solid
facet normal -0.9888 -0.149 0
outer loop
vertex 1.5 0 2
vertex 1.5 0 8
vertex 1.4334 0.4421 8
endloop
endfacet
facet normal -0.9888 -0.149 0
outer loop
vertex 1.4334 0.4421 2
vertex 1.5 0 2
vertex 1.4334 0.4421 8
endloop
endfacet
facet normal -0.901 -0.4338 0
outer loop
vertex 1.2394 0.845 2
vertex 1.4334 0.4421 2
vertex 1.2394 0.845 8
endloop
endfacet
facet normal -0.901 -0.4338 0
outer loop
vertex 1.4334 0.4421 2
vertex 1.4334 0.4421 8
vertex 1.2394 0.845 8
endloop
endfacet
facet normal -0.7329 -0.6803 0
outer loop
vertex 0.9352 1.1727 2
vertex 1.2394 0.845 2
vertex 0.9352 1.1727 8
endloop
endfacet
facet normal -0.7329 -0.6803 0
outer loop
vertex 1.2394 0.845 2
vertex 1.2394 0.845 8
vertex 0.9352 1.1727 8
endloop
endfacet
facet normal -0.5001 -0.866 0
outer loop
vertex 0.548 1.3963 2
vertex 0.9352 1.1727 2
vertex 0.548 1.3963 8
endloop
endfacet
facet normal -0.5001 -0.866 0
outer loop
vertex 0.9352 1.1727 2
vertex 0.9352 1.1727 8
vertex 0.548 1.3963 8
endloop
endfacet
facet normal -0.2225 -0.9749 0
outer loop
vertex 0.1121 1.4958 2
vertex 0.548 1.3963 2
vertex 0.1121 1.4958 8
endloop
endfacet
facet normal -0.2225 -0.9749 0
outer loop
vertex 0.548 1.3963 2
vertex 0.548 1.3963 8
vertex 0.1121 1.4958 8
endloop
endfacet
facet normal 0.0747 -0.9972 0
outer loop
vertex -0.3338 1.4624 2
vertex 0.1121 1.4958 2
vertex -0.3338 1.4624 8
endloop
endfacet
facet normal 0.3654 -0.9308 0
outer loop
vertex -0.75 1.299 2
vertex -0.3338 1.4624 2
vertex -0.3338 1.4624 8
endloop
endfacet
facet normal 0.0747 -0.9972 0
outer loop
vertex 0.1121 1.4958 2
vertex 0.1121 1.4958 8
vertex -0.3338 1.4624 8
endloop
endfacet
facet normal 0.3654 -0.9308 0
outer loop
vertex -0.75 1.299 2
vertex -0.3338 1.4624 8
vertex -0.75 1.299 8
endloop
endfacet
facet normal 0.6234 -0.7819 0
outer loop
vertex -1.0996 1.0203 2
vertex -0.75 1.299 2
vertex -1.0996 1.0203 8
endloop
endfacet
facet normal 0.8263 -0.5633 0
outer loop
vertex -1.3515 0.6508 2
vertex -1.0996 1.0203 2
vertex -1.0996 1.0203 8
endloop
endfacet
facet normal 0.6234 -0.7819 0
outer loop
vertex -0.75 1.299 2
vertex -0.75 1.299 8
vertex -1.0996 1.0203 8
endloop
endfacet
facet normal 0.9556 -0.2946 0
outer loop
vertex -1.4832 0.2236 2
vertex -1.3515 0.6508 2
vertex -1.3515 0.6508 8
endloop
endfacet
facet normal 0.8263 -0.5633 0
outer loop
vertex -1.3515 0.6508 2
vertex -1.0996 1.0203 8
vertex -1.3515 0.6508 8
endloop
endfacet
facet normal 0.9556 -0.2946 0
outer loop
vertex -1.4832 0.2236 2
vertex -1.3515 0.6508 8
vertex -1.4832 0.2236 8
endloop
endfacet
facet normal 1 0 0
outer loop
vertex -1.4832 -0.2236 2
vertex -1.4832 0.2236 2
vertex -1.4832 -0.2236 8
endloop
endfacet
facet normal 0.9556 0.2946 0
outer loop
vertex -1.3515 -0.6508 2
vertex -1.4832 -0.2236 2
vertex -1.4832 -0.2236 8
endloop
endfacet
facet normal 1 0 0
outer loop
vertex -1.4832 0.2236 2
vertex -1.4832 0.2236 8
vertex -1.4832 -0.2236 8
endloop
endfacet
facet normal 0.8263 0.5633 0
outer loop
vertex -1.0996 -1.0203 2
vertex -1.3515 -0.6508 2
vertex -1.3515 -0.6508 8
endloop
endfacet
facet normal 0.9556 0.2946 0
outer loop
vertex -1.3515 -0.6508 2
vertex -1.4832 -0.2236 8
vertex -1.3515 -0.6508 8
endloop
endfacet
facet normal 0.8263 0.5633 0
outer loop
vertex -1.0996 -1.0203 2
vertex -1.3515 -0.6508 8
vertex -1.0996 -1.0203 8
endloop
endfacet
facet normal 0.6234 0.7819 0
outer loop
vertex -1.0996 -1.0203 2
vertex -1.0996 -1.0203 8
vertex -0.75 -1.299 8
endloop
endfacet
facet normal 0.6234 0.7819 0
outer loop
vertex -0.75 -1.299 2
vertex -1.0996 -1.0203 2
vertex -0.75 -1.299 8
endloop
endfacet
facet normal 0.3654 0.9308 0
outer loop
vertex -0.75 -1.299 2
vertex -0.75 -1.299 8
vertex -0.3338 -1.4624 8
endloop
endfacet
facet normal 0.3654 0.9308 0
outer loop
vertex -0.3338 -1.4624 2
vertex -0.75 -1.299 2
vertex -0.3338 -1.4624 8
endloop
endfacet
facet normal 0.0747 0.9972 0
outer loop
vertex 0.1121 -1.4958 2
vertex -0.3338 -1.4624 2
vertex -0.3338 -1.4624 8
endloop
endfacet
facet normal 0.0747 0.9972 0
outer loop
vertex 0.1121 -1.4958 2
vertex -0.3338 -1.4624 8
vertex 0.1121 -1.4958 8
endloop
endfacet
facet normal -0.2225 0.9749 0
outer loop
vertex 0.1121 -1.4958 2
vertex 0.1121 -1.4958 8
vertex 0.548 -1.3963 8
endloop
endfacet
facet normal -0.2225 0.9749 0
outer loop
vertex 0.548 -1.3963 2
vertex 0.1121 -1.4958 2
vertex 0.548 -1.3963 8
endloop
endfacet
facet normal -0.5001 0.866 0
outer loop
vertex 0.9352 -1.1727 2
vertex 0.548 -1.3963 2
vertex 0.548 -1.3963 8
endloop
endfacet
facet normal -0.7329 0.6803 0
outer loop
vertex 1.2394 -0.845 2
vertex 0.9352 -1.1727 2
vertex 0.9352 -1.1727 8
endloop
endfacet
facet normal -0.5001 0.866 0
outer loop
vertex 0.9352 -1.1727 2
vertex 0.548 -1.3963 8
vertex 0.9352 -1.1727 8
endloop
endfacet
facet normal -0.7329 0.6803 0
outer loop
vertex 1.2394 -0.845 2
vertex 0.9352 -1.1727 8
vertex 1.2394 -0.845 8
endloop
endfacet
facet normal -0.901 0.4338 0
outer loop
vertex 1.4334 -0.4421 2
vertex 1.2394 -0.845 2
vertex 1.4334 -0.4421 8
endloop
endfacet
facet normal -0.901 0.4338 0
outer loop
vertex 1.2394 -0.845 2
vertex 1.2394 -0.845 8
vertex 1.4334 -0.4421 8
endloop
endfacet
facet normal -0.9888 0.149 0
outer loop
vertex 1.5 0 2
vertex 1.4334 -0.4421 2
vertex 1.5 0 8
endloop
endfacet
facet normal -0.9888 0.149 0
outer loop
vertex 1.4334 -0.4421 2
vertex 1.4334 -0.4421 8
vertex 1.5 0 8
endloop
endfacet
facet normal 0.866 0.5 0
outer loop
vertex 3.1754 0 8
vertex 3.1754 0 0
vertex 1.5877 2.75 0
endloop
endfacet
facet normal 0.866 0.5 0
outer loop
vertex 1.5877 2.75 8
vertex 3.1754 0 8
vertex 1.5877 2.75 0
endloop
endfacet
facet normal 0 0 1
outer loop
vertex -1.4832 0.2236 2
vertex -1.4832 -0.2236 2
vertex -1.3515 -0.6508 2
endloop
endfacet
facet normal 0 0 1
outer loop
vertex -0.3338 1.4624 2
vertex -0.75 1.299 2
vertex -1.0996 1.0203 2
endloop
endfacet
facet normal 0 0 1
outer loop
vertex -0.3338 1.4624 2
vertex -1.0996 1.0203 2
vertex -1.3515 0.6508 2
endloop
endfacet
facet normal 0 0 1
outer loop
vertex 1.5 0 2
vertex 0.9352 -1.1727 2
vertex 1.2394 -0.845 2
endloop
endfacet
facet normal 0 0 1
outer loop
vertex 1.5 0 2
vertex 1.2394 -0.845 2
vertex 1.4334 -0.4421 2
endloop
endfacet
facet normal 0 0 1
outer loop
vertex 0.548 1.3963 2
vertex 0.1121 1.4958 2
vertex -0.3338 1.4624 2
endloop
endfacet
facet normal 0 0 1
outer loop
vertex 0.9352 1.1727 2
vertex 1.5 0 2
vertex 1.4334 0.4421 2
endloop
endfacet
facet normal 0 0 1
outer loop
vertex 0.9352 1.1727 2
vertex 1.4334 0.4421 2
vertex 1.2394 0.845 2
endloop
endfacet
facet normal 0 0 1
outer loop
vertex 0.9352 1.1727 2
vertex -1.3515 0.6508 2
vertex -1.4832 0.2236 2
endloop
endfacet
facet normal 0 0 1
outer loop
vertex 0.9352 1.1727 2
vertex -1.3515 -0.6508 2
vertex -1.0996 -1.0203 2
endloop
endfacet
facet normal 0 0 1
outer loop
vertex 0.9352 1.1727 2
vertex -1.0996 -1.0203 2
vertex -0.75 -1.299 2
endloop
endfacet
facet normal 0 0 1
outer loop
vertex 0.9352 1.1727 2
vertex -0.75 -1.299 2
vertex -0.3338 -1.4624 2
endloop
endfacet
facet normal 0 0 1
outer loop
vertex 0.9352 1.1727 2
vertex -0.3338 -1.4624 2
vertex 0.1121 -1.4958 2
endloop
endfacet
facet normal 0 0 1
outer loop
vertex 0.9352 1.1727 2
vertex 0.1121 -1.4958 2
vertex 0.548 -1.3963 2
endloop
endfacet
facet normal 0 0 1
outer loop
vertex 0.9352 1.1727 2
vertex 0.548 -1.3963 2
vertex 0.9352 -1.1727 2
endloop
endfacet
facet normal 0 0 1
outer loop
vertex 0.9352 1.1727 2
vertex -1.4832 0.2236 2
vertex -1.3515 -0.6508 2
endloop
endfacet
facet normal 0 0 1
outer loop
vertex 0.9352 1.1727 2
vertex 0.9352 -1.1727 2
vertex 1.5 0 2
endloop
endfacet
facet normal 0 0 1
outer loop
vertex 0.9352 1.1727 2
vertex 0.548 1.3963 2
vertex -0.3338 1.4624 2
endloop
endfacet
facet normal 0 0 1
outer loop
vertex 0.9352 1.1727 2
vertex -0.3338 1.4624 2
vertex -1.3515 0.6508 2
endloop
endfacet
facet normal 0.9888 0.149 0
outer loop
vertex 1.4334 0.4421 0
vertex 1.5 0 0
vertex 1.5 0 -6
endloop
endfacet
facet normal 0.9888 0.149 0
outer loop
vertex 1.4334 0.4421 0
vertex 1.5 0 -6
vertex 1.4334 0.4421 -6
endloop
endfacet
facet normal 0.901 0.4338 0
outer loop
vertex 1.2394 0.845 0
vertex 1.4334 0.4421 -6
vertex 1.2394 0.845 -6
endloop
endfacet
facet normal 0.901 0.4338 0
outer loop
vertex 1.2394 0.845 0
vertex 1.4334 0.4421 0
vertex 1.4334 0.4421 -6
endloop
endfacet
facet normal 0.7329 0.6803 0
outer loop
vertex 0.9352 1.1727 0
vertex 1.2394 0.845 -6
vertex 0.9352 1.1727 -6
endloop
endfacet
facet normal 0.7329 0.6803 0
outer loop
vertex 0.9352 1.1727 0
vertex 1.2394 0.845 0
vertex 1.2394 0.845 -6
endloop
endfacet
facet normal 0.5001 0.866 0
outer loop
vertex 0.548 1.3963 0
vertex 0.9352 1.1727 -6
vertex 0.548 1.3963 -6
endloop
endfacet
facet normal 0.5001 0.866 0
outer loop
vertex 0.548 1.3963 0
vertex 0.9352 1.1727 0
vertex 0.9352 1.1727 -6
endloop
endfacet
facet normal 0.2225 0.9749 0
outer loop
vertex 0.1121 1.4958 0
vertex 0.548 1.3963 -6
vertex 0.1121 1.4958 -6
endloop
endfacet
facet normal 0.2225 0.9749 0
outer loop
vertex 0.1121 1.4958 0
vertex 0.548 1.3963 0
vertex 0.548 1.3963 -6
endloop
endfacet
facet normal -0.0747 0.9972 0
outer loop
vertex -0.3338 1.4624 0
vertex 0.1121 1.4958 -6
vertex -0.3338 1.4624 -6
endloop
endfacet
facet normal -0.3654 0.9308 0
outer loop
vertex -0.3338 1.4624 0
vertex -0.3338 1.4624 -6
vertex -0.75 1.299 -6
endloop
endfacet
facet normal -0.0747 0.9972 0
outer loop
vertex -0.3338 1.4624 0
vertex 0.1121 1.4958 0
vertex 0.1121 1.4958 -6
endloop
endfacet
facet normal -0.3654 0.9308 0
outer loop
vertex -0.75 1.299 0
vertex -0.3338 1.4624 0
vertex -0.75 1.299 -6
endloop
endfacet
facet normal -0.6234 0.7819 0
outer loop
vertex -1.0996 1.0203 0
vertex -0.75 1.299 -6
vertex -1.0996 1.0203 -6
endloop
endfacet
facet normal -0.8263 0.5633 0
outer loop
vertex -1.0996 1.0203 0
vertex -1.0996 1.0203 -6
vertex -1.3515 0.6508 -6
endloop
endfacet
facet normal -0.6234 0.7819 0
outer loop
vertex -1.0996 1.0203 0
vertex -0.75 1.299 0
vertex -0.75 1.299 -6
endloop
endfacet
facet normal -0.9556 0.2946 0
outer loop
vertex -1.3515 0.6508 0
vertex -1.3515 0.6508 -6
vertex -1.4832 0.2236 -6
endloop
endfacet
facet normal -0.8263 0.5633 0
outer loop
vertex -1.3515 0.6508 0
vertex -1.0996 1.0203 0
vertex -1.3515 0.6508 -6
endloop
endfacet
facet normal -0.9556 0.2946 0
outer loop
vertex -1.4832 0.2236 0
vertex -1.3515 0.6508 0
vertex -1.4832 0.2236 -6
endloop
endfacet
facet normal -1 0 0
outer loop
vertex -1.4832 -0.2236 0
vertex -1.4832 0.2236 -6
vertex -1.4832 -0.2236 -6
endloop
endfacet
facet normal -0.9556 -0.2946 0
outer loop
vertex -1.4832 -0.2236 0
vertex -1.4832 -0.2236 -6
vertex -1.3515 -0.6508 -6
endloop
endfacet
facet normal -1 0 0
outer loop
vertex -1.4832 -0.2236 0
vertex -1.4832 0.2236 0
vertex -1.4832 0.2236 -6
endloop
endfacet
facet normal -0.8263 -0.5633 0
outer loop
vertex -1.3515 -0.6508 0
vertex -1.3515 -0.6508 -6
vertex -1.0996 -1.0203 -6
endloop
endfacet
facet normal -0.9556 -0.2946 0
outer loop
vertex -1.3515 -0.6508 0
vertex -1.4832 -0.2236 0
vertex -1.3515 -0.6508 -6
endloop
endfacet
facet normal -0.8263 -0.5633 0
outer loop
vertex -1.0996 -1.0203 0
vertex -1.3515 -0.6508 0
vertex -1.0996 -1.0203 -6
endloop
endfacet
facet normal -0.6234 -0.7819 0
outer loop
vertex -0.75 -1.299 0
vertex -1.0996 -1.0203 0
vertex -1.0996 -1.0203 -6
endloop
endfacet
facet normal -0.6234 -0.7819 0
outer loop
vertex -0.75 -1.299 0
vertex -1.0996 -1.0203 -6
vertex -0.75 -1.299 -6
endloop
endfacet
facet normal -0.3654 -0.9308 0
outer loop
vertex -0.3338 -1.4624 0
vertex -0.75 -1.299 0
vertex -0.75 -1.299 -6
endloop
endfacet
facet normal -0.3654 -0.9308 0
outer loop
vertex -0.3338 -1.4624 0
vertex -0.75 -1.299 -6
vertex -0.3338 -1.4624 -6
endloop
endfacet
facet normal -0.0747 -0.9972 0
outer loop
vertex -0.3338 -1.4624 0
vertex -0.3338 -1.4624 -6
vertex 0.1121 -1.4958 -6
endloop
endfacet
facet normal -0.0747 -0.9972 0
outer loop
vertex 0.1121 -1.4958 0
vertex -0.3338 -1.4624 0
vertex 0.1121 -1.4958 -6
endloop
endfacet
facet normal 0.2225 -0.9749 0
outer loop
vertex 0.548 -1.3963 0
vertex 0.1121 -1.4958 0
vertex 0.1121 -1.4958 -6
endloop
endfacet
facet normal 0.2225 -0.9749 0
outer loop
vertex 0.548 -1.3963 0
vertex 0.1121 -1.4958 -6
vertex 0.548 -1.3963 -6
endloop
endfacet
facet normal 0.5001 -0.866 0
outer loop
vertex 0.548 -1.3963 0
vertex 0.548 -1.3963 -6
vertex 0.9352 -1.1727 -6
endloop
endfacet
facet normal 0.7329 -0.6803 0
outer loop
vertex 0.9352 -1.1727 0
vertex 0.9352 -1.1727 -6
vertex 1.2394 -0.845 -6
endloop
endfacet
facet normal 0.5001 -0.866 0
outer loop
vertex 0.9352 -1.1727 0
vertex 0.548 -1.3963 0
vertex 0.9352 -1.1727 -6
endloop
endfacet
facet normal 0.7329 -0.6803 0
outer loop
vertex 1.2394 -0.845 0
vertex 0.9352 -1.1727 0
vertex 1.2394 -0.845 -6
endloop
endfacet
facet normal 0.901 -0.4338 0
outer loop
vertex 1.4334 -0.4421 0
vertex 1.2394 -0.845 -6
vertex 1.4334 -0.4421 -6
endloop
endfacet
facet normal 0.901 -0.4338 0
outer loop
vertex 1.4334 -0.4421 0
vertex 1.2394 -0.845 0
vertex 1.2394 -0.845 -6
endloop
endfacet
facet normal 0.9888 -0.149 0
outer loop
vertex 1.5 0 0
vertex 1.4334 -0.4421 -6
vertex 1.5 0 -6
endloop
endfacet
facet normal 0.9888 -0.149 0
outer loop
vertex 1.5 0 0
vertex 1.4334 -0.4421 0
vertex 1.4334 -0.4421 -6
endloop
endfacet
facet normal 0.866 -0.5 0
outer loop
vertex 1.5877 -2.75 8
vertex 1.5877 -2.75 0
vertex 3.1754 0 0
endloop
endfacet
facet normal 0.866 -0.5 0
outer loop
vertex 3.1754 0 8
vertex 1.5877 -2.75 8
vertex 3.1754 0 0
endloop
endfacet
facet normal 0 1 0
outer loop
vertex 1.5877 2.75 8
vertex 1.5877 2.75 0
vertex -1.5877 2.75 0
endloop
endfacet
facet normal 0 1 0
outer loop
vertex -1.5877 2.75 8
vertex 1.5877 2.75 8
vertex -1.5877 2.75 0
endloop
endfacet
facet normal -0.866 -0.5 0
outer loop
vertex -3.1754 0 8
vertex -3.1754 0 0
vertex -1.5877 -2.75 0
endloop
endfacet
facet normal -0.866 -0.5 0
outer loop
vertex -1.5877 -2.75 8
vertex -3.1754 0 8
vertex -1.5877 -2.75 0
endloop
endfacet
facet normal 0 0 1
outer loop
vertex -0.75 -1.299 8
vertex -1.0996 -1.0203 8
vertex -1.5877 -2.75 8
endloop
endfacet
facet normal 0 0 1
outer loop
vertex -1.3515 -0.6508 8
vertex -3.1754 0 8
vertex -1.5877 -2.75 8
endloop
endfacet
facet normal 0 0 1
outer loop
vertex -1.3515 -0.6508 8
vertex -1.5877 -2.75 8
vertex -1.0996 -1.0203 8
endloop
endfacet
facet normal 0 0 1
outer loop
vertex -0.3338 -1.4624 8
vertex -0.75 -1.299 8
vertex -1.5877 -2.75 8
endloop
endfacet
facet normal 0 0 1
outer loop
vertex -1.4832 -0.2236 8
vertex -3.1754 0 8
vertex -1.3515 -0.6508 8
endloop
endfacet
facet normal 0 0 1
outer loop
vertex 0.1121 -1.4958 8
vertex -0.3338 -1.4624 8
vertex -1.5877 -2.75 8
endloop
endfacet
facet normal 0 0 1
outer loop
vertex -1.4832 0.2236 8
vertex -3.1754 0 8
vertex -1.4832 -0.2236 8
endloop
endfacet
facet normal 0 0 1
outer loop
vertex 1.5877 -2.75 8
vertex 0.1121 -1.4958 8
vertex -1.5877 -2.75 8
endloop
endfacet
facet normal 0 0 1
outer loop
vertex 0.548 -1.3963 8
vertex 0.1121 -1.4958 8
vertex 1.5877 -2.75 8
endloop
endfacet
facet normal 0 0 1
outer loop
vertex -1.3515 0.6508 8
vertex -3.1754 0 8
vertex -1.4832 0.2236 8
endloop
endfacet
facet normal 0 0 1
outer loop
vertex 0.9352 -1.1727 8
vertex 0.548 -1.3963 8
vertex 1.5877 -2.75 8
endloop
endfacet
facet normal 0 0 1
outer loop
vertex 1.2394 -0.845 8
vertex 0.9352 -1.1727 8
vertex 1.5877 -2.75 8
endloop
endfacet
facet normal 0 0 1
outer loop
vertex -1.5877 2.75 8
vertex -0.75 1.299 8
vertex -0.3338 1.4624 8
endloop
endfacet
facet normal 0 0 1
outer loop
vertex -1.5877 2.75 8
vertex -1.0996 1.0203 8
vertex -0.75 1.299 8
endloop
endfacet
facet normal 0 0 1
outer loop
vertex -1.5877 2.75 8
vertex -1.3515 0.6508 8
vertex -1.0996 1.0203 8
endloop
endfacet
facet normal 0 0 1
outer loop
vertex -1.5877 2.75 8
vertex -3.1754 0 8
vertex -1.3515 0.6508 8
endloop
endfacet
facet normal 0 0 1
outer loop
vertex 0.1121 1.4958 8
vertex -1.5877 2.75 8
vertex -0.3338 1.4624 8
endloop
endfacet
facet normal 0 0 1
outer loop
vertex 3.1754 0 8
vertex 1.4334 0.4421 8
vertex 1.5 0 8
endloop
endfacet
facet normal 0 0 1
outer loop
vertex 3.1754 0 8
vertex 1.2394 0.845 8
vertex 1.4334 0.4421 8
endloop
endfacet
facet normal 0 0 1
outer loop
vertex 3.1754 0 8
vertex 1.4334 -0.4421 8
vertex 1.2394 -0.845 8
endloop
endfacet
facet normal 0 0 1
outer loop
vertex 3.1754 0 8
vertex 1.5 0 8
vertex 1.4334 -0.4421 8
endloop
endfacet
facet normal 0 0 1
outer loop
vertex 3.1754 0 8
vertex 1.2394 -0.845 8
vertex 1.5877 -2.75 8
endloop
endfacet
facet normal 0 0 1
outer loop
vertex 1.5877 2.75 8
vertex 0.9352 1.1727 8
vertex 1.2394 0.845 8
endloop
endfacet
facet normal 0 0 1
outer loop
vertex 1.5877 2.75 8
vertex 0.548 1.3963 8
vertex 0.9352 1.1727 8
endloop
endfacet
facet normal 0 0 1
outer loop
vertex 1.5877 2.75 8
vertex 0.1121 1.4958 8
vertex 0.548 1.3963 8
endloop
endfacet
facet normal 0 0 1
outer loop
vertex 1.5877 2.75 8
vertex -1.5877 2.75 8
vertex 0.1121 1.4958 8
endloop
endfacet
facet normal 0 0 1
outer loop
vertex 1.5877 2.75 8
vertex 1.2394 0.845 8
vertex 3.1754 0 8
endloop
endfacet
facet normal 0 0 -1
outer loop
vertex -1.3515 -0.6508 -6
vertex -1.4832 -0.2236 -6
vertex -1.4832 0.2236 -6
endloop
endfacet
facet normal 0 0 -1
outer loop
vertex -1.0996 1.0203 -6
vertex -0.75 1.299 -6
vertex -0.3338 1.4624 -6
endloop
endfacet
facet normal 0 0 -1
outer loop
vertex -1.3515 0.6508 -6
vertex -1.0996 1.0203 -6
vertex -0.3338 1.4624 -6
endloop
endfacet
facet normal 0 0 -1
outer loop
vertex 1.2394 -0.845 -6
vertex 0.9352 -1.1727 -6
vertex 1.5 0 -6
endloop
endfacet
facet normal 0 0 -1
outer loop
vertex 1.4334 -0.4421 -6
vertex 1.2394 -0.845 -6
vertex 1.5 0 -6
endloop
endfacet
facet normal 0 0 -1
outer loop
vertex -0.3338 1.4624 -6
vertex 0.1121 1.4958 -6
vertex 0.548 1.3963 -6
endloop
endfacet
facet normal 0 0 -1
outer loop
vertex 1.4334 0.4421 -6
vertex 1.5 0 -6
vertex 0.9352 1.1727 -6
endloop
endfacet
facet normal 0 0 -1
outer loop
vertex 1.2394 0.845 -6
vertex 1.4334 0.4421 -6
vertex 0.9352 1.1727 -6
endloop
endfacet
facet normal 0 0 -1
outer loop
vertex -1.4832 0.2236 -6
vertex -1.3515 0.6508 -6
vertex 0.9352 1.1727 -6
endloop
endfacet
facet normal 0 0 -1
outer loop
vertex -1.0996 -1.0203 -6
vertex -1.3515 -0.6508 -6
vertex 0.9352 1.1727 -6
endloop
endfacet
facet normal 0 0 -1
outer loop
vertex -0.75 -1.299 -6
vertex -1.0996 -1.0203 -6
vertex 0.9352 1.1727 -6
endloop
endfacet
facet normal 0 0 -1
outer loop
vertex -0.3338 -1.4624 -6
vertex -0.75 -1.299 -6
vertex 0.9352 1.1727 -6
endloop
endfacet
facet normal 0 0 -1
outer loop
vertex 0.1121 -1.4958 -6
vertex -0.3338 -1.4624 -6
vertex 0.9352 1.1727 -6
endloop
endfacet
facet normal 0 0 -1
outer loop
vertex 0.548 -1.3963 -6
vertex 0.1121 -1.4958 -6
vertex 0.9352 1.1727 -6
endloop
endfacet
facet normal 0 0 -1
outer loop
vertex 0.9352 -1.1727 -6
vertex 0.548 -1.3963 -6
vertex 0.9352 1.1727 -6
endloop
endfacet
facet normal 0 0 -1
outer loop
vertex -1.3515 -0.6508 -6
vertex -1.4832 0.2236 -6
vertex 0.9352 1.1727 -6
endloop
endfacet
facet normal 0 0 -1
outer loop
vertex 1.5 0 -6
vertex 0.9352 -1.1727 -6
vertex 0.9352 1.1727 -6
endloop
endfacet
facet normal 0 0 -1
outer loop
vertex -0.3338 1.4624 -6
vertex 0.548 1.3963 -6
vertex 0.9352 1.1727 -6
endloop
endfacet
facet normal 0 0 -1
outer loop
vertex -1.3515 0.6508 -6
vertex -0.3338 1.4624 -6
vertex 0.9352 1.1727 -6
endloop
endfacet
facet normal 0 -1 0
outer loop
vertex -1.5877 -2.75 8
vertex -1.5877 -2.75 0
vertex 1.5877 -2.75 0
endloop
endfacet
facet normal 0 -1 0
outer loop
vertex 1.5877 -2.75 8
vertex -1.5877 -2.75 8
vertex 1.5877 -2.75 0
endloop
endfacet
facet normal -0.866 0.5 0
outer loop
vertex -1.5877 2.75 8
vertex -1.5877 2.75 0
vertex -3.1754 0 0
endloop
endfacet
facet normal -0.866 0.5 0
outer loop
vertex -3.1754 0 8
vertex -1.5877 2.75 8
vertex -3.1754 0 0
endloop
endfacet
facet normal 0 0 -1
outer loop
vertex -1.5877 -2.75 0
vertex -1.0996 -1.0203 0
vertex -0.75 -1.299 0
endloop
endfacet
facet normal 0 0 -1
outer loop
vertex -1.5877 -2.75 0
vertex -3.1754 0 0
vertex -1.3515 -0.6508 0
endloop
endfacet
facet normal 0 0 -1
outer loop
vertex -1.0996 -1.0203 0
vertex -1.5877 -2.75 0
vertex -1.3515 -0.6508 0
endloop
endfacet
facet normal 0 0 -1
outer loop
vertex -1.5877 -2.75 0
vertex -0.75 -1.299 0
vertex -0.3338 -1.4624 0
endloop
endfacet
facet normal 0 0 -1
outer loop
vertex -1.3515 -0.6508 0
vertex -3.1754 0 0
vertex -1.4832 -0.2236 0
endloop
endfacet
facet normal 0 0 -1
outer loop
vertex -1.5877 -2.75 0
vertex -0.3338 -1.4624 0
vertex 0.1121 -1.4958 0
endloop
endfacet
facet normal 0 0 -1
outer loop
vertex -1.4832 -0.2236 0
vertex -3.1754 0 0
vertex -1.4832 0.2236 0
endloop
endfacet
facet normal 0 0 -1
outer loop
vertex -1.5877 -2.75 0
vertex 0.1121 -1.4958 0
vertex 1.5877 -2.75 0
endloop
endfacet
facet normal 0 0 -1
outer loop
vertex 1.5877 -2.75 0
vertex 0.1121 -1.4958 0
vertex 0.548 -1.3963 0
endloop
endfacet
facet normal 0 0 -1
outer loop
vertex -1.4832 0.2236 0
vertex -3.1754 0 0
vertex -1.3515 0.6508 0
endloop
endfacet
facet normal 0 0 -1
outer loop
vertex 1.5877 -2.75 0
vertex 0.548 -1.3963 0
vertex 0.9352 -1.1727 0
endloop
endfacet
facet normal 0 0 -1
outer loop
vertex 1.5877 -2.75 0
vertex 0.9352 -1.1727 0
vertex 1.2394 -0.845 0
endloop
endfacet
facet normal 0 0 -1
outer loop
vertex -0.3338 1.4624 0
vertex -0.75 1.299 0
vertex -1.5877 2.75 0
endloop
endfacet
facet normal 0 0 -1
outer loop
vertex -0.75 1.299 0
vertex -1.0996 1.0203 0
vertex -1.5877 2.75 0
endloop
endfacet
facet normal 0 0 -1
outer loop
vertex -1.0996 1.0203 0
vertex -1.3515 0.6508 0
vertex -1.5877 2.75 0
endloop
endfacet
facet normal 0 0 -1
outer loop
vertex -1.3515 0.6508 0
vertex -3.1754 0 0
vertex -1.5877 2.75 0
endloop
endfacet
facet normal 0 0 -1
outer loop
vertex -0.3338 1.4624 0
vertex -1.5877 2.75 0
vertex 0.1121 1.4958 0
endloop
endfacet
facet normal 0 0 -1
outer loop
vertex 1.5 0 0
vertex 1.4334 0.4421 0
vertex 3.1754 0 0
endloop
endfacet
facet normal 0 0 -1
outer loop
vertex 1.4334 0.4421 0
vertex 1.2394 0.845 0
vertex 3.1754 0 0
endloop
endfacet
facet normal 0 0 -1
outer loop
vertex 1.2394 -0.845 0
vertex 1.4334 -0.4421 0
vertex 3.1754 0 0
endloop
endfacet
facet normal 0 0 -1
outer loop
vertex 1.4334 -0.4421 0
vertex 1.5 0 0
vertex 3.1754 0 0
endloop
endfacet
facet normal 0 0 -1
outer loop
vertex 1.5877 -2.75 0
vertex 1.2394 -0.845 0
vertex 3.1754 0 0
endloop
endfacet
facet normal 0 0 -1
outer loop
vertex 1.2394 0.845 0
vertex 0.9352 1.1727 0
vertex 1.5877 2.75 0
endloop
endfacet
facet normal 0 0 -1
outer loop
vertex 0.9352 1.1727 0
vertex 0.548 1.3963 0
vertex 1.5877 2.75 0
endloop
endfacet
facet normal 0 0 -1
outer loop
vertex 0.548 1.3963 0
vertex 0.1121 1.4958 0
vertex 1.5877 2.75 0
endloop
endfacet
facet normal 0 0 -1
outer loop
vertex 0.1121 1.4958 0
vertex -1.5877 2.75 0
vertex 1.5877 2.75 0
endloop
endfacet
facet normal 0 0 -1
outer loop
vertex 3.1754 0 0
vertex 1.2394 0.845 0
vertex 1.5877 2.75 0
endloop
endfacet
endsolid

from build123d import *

# Parameters (mm, degrees)
BOSS_EXTRUDE1_DEPTH = 8
SKETCH1_3_R         = 1.5
BOSS_EXTRUDE2_DEPTH = 6
CUT_EXTRUDE1_START  = 8
SKETCH1_4_R         = 1.5
CUT_EXTRUDE1_DEPTH  = 6


with BuildPart() as part:
    # Sketch1 → Boss-Extrude1 (new body)
    with BuildSketch(Plane.XY):
        Polygon((1.58771324, -2.75), (3.175426481, 0), (1.58771324, 2.75), (-1.58771324, 2.75), (-3.175426481, 0), (-1.58771324, -2.75), align=None)
    extrude(amount=BOSS_EXTRUDE1_DEPTH)

    # Sketch1<3> → Boss-Extrude2 (add)
    with BuildSketch(Plane.XY):
        Circle(SKETCH1_3_R)
    extrude(amount=-BOSS_EXTRUDE2_DEPTH)

    # Sketch1<4> → Cut-Extrude1 (cut)
    with BuildSketch(Plane.XY.offset(CUT_EXTRUDE1_START)):
        Circle(SKETCH1_4_R)
    extrude(amount=-CUT_EXTRUDE1_DEPTH, mode=Mode.SUBTRACT)


solid = part.part
